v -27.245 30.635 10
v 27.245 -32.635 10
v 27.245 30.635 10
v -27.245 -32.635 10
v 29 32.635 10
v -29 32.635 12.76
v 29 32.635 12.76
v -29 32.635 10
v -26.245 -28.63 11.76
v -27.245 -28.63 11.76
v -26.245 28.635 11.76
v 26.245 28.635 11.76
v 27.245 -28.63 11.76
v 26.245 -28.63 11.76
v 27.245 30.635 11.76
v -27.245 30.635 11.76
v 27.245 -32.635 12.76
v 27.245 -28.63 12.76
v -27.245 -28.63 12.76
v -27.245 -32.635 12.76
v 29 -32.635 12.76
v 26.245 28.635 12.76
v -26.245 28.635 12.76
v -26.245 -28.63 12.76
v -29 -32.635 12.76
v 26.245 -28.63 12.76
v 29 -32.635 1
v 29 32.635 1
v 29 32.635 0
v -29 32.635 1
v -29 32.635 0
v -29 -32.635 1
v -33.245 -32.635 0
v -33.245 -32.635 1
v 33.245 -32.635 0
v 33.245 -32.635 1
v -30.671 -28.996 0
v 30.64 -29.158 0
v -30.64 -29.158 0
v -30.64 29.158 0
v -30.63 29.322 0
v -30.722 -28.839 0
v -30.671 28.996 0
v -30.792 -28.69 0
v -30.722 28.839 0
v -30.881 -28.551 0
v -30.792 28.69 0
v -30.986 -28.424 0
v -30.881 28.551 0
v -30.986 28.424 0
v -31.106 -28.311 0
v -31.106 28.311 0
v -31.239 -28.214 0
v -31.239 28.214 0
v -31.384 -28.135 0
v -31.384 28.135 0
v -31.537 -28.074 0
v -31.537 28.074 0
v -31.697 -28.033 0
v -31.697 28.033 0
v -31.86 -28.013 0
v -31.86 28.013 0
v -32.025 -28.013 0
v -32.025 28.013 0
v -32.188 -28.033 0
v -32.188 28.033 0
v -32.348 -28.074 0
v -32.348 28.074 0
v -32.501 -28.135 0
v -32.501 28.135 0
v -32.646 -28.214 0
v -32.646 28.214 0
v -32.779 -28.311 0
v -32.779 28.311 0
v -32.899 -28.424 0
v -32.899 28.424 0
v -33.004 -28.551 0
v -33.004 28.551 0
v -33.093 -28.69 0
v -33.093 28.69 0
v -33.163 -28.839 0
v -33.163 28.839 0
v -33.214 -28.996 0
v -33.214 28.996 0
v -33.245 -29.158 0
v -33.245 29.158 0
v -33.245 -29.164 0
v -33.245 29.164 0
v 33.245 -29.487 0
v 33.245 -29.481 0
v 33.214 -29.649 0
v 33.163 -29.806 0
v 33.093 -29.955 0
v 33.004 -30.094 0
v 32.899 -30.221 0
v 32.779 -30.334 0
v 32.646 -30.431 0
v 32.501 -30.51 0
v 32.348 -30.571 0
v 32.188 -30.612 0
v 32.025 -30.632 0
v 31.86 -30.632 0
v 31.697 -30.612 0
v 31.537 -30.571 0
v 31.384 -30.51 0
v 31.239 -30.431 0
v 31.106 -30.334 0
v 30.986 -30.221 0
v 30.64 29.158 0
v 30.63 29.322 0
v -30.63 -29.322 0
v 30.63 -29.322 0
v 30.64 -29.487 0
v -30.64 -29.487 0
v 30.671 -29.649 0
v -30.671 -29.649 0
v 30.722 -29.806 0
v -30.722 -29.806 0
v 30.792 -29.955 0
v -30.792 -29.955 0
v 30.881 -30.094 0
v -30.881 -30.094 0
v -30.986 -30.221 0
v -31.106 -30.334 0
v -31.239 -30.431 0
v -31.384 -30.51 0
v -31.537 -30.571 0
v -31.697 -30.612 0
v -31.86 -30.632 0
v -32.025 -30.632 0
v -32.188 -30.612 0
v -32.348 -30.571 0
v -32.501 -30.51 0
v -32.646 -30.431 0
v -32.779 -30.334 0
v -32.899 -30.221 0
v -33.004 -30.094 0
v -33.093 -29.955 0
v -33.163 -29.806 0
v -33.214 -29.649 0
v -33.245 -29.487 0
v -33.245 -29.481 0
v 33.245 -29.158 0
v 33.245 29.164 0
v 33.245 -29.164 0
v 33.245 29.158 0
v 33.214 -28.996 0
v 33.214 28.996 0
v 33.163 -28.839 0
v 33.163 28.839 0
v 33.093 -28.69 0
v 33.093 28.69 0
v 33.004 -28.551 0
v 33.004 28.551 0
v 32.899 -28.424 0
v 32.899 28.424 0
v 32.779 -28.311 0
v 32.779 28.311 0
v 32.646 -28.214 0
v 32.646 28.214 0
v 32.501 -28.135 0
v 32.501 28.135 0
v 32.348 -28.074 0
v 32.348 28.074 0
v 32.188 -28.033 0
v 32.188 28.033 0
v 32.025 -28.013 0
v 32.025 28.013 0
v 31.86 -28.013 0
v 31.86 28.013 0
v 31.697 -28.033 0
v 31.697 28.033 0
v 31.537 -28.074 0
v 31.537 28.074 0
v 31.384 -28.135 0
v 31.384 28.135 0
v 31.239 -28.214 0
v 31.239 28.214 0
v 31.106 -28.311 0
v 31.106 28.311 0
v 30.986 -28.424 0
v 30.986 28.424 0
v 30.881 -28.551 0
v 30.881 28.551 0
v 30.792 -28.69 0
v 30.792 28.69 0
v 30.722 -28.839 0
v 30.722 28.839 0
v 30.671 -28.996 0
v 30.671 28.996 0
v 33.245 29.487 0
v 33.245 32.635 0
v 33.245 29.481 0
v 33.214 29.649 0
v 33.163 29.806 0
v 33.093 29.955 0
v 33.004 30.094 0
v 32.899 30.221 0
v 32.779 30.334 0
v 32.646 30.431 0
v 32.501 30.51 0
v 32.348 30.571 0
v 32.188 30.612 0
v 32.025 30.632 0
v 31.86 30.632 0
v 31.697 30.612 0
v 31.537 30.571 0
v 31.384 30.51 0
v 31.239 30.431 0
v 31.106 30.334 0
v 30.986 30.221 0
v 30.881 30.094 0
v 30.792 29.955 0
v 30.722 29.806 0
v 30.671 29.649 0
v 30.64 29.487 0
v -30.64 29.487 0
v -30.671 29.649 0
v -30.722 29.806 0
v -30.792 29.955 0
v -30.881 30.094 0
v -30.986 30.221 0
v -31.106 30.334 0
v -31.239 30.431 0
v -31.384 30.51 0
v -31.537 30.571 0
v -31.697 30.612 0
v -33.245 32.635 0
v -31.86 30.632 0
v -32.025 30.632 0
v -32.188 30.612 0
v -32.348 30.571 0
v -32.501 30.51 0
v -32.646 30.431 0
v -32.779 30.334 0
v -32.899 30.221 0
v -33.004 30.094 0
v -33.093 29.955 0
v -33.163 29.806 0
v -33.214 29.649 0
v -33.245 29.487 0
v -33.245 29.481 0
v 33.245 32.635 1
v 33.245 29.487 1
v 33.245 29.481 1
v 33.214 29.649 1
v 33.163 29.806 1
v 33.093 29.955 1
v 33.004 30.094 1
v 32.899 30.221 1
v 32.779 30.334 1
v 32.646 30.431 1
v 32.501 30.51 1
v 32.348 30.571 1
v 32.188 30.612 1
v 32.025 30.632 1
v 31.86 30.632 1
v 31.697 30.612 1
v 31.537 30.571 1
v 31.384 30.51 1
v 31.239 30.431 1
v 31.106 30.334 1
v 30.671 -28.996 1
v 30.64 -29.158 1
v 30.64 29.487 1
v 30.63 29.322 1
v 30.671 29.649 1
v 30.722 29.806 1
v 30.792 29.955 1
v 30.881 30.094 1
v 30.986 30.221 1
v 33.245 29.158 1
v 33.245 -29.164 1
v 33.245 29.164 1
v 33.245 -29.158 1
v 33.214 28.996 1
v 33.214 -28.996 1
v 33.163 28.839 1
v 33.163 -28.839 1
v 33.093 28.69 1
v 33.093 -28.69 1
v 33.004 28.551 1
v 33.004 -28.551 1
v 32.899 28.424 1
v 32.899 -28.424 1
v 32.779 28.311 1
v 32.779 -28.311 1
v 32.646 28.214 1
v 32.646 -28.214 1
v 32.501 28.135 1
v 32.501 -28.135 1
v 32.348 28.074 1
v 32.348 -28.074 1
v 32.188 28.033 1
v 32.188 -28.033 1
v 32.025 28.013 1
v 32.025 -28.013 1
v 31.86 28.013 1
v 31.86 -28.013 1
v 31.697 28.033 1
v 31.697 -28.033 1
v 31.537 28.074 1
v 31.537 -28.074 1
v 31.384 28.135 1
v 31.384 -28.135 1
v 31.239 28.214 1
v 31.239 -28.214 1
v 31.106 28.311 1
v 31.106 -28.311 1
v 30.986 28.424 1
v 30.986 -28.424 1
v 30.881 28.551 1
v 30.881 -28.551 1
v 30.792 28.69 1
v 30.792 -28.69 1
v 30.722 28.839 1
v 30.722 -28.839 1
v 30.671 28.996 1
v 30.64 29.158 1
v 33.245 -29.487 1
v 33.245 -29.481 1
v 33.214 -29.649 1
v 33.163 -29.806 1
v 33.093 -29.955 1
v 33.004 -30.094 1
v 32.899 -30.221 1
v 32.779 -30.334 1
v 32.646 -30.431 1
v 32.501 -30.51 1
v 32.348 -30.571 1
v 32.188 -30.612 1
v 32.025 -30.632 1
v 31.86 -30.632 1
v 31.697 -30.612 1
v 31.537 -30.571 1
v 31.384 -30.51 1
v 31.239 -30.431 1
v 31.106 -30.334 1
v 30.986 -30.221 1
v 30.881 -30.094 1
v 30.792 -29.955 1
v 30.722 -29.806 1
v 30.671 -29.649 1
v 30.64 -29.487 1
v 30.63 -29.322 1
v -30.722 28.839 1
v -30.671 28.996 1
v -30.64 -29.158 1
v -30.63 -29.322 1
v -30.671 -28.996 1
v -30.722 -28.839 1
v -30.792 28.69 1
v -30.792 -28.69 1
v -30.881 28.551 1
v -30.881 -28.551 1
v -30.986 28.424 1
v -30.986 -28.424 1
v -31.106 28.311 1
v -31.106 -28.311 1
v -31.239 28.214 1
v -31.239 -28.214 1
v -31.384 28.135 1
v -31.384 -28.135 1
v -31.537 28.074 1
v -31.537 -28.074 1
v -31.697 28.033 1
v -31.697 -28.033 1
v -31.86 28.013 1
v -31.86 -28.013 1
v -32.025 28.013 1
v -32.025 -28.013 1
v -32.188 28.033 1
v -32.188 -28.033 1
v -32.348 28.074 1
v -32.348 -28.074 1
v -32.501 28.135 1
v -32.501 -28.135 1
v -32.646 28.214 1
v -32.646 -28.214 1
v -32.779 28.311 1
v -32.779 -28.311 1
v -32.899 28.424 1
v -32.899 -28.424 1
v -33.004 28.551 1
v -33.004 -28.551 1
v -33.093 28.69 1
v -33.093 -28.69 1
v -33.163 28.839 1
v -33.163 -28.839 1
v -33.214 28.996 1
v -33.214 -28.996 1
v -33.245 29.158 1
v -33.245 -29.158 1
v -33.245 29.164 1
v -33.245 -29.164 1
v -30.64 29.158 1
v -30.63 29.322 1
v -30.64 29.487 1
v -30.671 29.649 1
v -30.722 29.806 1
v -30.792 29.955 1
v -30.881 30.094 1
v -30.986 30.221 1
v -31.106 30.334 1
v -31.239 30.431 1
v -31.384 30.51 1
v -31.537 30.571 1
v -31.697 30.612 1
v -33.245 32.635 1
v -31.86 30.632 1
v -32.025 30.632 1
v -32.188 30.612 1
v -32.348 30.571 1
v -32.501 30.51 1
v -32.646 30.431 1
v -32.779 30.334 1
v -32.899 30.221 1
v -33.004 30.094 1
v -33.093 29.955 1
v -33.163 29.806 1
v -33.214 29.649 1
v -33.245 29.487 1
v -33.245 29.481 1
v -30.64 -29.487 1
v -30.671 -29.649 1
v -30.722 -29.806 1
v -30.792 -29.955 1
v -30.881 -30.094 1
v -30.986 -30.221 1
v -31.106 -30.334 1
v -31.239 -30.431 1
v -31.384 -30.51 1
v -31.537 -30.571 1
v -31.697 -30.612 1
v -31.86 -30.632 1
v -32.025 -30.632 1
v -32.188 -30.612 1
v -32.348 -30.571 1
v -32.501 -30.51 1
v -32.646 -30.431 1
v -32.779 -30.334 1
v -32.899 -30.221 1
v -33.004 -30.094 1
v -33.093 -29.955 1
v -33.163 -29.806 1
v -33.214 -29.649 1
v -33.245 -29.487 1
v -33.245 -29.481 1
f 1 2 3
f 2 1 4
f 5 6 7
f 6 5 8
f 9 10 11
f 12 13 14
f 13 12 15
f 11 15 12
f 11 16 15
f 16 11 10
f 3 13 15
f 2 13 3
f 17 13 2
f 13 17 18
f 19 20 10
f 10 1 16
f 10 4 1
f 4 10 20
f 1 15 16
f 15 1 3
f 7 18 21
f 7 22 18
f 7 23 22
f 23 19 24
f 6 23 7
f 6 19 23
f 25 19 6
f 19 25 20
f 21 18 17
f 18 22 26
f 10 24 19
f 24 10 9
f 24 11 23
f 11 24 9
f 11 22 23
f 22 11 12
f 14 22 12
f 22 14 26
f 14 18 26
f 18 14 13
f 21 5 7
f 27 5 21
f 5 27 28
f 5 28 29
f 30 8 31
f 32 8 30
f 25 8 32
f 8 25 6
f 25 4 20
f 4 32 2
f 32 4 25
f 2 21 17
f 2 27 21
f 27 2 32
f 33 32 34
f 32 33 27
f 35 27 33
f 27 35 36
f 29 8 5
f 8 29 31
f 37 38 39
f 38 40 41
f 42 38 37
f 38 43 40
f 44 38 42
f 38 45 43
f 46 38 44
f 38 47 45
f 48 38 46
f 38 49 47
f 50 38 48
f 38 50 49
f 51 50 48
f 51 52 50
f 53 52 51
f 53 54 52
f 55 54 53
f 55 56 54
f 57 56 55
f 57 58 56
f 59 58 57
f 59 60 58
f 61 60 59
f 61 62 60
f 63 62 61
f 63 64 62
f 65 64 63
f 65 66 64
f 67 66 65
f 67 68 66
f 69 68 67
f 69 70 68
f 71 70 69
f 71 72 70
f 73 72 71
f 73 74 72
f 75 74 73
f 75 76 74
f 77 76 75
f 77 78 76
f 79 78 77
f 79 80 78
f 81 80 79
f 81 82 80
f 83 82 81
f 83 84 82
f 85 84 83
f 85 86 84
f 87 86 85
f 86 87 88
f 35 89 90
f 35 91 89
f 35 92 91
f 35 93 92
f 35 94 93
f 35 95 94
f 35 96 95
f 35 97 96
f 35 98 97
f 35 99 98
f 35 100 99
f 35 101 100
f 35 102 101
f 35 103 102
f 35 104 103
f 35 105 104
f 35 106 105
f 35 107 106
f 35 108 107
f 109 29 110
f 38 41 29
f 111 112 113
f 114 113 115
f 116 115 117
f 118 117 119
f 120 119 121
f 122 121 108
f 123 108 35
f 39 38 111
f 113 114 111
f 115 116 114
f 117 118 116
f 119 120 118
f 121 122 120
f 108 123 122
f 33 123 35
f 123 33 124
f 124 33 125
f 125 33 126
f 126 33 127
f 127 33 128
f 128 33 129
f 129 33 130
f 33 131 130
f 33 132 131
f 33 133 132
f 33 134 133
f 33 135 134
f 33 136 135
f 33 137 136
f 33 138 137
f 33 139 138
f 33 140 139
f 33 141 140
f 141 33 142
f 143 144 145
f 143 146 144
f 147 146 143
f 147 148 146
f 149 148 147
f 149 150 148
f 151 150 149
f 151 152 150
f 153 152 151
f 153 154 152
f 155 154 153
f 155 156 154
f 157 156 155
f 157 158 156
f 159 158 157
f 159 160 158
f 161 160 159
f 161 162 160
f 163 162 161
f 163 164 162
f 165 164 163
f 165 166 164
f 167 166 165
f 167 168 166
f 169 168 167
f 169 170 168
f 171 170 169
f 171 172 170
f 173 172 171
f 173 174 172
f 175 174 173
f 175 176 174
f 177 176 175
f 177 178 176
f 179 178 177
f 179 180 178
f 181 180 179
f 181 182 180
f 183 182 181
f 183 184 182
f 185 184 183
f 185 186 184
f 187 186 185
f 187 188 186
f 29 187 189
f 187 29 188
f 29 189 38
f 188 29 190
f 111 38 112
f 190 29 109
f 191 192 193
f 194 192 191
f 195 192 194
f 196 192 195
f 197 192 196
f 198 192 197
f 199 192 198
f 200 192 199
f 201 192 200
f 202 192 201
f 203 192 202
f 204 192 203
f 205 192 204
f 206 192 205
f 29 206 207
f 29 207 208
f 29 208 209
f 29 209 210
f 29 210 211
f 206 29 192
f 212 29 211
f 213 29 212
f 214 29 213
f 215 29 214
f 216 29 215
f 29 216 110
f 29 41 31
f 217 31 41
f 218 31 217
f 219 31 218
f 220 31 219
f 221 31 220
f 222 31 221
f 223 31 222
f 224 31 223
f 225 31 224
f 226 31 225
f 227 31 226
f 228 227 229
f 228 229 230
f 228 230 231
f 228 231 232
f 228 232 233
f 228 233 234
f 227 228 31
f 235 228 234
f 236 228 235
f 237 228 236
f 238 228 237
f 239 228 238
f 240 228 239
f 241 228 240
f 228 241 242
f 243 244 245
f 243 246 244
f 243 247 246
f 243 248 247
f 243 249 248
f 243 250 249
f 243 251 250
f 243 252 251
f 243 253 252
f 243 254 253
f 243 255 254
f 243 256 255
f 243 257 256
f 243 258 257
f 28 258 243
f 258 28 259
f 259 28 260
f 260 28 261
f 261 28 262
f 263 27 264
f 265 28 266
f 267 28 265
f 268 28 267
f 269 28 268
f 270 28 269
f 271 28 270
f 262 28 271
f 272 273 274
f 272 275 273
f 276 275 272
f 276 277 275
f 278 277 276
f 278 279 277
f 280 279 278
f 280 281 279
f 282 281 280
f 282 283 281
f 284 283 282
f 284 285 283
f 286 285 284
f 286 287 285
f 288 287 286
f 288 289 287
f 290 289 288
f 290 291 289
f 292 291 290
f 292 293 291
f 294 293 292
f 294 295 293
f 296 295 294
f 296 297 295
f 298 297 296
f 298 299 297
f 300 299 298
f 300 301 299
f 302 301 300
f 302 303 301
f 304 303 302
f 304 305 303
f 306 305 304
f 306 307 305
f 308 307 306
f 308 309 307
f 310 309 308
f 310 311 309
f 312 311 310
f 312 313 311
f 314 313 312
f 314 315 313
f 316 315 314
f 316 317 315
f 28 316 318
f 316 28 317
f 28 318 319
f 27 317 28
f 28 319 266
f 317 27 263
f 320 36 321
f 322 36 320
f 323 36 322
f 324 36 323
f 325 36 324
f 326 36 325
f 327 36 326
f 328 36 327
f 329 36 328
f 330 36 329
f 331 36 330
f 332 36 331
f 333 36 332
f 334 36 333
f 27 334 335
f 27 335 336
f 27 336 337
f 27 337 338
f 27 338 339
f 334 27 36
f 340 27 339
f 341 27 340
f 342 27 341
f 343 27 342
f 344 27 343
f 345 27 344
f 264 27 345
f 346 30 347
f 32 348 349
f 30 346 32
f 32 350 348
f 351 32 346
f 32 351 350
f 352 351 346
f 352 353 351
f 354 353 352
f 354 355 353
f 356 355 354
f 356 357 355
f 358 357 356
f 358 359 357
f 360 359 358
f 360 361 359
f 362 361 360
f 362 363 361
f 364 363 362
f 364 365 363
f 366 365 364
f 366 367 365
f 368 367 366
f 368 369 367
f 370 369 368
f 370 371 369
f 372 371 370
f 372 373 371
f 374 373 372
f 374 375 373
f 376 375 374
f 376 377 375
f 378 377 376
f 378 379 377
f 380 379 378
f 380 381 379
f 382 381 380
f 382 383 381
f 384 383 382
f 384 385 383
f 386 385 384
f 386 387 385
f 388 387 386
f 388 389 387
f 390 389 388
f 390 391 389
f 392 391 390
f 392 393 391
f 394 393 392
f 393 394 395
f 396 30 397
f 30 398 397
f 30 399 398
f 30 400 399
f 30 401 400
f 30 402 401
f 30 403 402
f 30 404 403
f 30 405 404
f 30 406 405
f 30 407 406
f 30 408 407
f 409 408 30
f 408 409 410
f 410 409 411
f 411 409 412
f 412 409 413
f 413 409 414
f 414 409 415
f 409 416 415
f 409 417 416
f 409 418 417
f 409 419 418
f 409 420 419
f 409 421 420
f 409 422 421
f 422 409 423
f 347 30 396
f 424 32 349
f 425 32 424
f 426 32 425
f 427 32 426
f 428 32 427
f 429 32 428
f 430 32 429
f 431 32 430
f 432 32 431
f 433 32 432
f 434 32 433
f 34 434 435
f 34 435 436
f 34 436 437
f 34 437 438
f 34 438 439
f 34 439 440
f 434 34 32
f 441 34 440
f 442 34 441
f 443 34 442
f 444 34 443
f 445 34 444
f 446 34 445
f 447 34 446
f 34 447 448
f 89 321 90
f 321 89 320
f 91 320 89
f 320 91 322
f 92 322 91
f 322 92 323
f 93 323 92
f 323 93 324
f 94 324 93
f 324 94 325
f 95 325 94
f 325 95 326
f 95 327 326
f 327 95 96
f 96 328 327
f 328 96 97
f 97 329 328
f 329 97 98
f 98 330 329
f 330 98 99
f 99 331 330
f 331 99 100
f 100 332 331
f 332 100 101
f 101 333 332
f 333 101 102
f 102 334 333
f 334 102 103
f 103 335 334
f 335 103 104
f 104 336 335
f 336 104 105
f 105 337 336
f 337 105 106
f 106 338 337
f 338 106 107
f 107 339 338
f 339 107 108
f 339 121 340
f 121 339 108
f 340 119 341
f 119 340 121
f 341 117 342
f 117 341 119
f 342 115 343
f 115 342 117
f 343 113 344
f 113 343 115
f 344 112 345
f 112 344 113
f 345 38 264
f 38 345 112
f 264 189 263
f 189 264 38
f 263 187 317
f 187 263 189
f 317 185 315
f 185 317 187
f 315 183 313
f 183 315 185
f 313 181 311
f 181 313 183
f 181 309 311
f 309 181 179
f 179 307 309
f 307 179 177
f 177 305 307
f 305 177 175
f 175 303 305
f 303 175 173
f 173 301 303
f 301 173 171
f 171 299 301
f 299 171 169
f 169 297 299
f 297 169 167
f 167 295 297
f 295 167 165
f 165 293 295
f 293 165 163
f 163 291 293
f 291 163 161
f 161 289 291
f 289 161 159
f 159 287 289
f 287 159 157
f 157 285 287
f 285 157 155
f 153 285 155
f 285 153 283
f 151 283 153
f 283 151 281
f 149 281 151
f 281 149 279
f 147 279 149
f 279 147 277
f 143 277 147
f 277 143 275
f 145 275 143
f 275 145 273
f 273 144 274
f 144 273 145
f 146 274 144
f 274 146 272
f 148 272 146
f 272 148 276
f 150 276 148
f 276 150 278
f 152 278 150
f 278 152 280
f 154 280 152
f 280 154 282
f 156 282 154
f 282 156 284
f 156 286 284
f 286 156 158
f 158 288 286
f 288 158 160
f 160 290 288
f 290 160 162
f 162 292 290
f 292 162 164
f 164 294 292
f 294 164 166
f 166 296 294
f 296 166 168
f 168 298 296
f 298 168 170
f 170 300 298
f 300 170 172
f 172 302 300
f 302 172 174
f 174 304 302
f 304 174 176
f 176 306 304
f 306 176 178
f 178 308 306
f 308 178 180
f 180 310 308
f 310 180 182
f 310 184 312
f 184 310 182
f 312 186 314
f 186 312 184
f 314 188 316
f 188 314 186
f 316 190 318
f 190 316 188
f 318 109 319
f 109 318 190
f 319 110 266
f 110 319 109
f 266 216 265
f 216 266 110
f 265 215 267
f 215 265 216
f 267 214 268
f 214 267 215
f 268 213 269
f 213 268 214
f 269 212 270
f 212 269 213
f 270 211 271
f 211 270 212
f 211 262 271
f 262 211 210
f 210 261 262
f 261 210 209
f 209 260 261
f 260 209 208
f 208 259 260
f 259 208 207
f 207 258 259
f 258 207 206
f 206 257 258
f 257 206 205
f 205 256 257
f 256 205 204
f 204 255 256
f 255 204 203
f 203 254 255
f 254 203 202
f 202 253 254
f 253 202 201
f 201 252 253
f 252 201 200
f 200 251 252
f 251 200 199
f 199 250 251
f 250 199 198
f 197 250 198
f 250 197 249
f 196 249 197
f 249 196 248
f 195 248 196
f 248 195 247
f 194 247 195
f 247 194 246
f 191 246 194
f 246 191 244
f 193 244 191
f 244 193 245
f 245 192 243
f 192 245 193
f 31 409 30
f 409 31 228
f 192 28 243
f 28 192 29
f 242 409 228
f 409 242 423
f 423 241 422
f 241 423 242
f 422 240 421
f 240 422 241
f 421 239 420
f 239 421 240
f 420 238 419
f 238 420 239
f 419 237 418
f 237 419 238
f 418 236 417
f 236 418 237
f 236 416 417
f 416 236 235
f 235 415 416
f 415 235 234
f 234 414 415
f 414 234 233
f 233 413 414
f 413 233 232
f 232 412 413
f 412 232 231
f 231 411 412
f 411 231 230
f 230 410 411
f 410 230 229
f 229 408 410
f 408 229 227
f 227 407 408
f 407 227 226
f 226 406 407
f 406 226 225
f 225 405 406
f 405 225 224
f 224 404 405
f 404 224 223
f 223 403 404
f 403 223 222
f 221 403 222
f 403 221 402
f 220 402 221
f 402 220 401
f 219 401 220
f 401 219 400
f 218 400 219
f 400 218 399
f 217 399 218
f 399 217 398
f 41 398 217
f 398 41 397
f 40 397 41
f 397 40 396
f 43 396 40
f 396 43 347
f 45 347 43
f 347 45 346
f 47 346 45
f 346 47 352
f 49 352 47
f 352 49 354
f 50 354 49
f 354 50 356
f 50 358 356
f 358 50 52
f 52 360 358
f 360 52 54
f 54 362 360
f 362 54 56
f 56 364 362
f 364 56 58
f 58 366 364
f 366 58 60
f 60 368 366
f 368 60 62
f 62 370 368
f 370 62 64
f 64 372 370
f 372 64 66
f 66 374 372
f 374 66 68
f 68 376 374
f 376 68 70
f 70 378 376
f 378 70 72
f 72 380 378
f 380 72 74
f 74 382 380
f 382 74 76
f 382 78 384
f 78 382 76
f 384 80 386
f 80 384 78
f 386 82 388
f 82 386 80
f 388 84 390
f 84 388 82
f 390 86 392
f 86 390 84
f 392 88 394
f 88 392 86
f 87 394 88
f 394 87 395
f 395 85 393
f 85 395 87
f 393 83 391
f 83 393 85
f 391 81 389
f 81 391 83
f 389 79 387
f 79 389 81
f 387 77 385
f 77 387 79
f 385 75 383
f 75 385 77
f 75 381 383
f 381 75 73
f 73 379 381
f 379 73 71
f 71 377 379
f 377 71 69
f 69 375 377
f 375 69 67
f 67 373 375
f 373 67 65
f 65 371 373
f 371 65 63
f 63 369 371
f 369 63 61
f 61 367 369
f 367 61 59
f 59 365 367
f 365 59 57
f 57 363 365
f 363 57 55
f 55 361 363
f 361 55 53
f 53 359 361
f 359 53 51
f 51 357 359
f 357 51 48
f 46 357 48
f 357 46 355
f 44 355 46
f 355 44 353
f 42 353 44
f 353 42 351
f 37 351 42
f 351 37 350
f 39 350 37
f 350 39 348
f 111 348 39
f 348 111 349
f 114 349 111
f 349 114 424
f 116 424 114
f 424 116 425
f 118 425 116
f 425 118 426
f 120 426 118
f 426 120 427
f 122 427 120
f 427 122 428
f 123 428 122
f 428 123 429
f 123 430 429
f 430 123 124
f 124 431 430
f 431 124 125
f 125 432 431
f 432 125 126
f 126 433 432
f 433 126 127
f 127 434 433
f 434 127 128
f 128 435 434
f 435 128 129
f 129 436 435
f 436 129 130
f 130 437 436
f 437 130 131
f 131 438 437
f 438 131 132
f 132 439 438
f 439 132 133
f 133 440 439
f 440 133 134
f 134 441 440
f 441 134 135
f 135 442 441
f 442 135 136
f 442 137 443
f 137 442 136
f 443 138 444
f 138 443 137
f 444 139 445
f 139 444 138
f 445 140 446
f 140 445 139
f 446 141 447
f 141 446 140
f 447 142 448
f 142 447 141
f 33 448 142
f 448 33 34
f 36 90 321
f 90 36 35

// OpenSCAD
// file: ../headset/params.scad
$fn = 50;
EPSILON = 0.01;
//TE_ERR = 0.45; // Potential length error caused by plastic thermal expansion
TE_ERR = 0.25; // Potential length error caused by plastic thermal expansion

IPD = 68.5;
lens_d = 40 + 0.5;
lens_focal = 50;
lens_outer = 2;
lens_thick = 2;

panel_w = 150;
panel_h = 75;
panel_d = 3;

case_roundness = 4;

disp_con_w = 100;
disp_con_h = 40;

mpu_w = 25;
mpu_h = 15;

holder_w = 9;
holder_d = 1;
holder_space = panel_d + TE_ERR;
module_hole_dist = 10;

strap_mount_ztop = 35;
strap_mount_zside = 10;

nose_mount_offset = [10, 0];
    
face_len = 40;

M2_5_r = 1.25 + 0.2;
M2_5_nut_l = 2;

case_thickness = 2.5;
case_gap_outer = 2;

controller_panel_hole_h = 3;
// file: ../headset/display_frame.scad
//EPSILON = 0.01; 
//$fn = 50;

include <params.scad>;

// In MM
screen_w = 54.24 + TE_ERR;
screen_h = 59.02 + TE_ERR;
screen_d = 1.51 + TE_ERR;

dframe_tapeout_h = 4; // TODO: Measure it correctly

dframe_side_thick = 2;
dframe_side_h = screen_d;
dframe_base_thick = 1;

dframe_side_w = 4;

holder_edge = 1;
holder_h = 1;

// Calculated
dframe_base_w = 2*dframe_side_thick + screen_w + 2*dframe_side_w;
dframe_base_h = dframe_side_thick + screen_h + dframe_tapeout_h;

dframe_offset_x = -EPSILON;
dframe_offset_y = 2;

dframe_nut_r = 1.25 + TE_ERR * 0.25;
dframe_nut_pos = [
    dframe_base_w/2 - dframe_nut_r - dframe_offset_x,
    dframe_base_h/2 - dframe_nut_r - dframe_offset_y
];

reference_te_err = TE_ERR * 3;

module dframe_dot_pattern(w, h) {
    dot_l = 2.4;
    dot_xn = w/(dot_l*2);
    dot_yn = h/(dot_l*2);

    off_x = dot_l;
    off_y = dot_l;

    for(y=[off_y : dot_l*2 : h - dot_l]) {
        for(x=[off_x : dot_l*2 : w - dot_l])
            translate([x,y]) square([dot_l, dot_l]);
    }
}

module dframe_reference_nut_holes() {
    module hole(mx, my) {
        translate([mx * dframe_nut_pos[0], my * dframe_nut_pos[1]])
            circle(r=dframe_nut_r);
    }
    
    translate([dframe_base_w/2, dframe_base_h/2]) {
        hole(1,1);
        hole(-1,1);
        hole(1,-1);
        hole(-1,-1);
    }
}

module dframe_mount_pattern() {
    translate([-dframe_base_w/2, -dframe_base_h/2]) {
        dframe_reference_nut_holes();
        translate([dframe_side_thick + dframe_side_w, dframe_tapeout_h]) dframe_dot_pattern(screen_w, screen_h);
    }
}

module display_reference_flat() {
    square([screen_w, screen_h]);
}
module display_reference_visible() {
    square([screen_w - 2*holder_edge, screen_h - 2*holder_edge]);
}

module display_reference_both(ipd) {
    rotate([90,0,0])
    linear_extrude(dframe_base_thick, convexity=20)
    square([dframe_base_w + reference_te_err + ipd, dframe_base_h + reference_te_err], center=true);
}


module tapeout_reference() {
    square([screen_w, dframe_tapeout_h + EPSILON]);
}

module dframe_bare() {
    linear_extrude(dframe_side_h)
    difference() {
        square([dframe_base_w - 2*dframe_side_w, dframe_base_h]); // Change later

        translate([dframe_side_thick, dframe_tapeout_h])
            display_reference_flat();

        translate([dframe_side_thick, -EPSILON/2])
            tapeout_reference();
    }
}

module dframe_holder() {
    linear_extrude(holder_h)
    difference() {
        square([dframe_base_w - 2*dframe_side_w, dframe_base_h]); // Change later

        translate([dframe_side_thick + holder_edge, dframe_tapeout_h])
            display_reference_visible();

        translate([dframe_side_thick, -EPSILON/2])
            tapeout_reference();
    }
}

module dframe_base() {
    linear_extrude(dframe_base_thick)
    difference() {
        square([dframe_base_w, dframe_base_h]);

        dframe_reference_nut_holes();
        translate([dframe_side_thick + dframe_side_w, dframe_tapeout_h]) dframe_dot_pattern(screen_w, screen_h);
    }
}

module dframe_full() {
    translate([-dframe_base_w/2, -dframe_base_h/2])
    union() {
        dframe_base();
        translate([dframe_side_w,0,dframe_base_thick]) dframe_bare();
        translate([dframe_side_w,0,dframe_base_thick + dframe_side_h]) dframe_holder();
    }
}

//translate([0,80,0]) dframe_full();
// main file
include <../headset/display_frame.scad>;

lens_thick = 2;
extend_length = 10 - lens_thick/2;
base_width = 58;

union() {
    linear_extrude(dframe_base_thick)
    translate([-dframe_base_w/2, -dframe_base_h/2])
    difference() {
        square([dframe_base_w, dframe_base_h]);
        dframe_reference_nut_holes();
    }

    translate([-base_width/2, -dframe_base_h/2])
    cube([base_width, dframe_base_h, extend_length]);

    translate([0,0,extend_length])
    union() {
        translate([0,0,dframe_base_thick/2])
        cube([base_width, dframe_base_h, dframe_base_thick], center=true);

        intersection() {
            cube([base_width, dframe_base_h,500], center=true);
            dframe_full();
        }
    }
}
